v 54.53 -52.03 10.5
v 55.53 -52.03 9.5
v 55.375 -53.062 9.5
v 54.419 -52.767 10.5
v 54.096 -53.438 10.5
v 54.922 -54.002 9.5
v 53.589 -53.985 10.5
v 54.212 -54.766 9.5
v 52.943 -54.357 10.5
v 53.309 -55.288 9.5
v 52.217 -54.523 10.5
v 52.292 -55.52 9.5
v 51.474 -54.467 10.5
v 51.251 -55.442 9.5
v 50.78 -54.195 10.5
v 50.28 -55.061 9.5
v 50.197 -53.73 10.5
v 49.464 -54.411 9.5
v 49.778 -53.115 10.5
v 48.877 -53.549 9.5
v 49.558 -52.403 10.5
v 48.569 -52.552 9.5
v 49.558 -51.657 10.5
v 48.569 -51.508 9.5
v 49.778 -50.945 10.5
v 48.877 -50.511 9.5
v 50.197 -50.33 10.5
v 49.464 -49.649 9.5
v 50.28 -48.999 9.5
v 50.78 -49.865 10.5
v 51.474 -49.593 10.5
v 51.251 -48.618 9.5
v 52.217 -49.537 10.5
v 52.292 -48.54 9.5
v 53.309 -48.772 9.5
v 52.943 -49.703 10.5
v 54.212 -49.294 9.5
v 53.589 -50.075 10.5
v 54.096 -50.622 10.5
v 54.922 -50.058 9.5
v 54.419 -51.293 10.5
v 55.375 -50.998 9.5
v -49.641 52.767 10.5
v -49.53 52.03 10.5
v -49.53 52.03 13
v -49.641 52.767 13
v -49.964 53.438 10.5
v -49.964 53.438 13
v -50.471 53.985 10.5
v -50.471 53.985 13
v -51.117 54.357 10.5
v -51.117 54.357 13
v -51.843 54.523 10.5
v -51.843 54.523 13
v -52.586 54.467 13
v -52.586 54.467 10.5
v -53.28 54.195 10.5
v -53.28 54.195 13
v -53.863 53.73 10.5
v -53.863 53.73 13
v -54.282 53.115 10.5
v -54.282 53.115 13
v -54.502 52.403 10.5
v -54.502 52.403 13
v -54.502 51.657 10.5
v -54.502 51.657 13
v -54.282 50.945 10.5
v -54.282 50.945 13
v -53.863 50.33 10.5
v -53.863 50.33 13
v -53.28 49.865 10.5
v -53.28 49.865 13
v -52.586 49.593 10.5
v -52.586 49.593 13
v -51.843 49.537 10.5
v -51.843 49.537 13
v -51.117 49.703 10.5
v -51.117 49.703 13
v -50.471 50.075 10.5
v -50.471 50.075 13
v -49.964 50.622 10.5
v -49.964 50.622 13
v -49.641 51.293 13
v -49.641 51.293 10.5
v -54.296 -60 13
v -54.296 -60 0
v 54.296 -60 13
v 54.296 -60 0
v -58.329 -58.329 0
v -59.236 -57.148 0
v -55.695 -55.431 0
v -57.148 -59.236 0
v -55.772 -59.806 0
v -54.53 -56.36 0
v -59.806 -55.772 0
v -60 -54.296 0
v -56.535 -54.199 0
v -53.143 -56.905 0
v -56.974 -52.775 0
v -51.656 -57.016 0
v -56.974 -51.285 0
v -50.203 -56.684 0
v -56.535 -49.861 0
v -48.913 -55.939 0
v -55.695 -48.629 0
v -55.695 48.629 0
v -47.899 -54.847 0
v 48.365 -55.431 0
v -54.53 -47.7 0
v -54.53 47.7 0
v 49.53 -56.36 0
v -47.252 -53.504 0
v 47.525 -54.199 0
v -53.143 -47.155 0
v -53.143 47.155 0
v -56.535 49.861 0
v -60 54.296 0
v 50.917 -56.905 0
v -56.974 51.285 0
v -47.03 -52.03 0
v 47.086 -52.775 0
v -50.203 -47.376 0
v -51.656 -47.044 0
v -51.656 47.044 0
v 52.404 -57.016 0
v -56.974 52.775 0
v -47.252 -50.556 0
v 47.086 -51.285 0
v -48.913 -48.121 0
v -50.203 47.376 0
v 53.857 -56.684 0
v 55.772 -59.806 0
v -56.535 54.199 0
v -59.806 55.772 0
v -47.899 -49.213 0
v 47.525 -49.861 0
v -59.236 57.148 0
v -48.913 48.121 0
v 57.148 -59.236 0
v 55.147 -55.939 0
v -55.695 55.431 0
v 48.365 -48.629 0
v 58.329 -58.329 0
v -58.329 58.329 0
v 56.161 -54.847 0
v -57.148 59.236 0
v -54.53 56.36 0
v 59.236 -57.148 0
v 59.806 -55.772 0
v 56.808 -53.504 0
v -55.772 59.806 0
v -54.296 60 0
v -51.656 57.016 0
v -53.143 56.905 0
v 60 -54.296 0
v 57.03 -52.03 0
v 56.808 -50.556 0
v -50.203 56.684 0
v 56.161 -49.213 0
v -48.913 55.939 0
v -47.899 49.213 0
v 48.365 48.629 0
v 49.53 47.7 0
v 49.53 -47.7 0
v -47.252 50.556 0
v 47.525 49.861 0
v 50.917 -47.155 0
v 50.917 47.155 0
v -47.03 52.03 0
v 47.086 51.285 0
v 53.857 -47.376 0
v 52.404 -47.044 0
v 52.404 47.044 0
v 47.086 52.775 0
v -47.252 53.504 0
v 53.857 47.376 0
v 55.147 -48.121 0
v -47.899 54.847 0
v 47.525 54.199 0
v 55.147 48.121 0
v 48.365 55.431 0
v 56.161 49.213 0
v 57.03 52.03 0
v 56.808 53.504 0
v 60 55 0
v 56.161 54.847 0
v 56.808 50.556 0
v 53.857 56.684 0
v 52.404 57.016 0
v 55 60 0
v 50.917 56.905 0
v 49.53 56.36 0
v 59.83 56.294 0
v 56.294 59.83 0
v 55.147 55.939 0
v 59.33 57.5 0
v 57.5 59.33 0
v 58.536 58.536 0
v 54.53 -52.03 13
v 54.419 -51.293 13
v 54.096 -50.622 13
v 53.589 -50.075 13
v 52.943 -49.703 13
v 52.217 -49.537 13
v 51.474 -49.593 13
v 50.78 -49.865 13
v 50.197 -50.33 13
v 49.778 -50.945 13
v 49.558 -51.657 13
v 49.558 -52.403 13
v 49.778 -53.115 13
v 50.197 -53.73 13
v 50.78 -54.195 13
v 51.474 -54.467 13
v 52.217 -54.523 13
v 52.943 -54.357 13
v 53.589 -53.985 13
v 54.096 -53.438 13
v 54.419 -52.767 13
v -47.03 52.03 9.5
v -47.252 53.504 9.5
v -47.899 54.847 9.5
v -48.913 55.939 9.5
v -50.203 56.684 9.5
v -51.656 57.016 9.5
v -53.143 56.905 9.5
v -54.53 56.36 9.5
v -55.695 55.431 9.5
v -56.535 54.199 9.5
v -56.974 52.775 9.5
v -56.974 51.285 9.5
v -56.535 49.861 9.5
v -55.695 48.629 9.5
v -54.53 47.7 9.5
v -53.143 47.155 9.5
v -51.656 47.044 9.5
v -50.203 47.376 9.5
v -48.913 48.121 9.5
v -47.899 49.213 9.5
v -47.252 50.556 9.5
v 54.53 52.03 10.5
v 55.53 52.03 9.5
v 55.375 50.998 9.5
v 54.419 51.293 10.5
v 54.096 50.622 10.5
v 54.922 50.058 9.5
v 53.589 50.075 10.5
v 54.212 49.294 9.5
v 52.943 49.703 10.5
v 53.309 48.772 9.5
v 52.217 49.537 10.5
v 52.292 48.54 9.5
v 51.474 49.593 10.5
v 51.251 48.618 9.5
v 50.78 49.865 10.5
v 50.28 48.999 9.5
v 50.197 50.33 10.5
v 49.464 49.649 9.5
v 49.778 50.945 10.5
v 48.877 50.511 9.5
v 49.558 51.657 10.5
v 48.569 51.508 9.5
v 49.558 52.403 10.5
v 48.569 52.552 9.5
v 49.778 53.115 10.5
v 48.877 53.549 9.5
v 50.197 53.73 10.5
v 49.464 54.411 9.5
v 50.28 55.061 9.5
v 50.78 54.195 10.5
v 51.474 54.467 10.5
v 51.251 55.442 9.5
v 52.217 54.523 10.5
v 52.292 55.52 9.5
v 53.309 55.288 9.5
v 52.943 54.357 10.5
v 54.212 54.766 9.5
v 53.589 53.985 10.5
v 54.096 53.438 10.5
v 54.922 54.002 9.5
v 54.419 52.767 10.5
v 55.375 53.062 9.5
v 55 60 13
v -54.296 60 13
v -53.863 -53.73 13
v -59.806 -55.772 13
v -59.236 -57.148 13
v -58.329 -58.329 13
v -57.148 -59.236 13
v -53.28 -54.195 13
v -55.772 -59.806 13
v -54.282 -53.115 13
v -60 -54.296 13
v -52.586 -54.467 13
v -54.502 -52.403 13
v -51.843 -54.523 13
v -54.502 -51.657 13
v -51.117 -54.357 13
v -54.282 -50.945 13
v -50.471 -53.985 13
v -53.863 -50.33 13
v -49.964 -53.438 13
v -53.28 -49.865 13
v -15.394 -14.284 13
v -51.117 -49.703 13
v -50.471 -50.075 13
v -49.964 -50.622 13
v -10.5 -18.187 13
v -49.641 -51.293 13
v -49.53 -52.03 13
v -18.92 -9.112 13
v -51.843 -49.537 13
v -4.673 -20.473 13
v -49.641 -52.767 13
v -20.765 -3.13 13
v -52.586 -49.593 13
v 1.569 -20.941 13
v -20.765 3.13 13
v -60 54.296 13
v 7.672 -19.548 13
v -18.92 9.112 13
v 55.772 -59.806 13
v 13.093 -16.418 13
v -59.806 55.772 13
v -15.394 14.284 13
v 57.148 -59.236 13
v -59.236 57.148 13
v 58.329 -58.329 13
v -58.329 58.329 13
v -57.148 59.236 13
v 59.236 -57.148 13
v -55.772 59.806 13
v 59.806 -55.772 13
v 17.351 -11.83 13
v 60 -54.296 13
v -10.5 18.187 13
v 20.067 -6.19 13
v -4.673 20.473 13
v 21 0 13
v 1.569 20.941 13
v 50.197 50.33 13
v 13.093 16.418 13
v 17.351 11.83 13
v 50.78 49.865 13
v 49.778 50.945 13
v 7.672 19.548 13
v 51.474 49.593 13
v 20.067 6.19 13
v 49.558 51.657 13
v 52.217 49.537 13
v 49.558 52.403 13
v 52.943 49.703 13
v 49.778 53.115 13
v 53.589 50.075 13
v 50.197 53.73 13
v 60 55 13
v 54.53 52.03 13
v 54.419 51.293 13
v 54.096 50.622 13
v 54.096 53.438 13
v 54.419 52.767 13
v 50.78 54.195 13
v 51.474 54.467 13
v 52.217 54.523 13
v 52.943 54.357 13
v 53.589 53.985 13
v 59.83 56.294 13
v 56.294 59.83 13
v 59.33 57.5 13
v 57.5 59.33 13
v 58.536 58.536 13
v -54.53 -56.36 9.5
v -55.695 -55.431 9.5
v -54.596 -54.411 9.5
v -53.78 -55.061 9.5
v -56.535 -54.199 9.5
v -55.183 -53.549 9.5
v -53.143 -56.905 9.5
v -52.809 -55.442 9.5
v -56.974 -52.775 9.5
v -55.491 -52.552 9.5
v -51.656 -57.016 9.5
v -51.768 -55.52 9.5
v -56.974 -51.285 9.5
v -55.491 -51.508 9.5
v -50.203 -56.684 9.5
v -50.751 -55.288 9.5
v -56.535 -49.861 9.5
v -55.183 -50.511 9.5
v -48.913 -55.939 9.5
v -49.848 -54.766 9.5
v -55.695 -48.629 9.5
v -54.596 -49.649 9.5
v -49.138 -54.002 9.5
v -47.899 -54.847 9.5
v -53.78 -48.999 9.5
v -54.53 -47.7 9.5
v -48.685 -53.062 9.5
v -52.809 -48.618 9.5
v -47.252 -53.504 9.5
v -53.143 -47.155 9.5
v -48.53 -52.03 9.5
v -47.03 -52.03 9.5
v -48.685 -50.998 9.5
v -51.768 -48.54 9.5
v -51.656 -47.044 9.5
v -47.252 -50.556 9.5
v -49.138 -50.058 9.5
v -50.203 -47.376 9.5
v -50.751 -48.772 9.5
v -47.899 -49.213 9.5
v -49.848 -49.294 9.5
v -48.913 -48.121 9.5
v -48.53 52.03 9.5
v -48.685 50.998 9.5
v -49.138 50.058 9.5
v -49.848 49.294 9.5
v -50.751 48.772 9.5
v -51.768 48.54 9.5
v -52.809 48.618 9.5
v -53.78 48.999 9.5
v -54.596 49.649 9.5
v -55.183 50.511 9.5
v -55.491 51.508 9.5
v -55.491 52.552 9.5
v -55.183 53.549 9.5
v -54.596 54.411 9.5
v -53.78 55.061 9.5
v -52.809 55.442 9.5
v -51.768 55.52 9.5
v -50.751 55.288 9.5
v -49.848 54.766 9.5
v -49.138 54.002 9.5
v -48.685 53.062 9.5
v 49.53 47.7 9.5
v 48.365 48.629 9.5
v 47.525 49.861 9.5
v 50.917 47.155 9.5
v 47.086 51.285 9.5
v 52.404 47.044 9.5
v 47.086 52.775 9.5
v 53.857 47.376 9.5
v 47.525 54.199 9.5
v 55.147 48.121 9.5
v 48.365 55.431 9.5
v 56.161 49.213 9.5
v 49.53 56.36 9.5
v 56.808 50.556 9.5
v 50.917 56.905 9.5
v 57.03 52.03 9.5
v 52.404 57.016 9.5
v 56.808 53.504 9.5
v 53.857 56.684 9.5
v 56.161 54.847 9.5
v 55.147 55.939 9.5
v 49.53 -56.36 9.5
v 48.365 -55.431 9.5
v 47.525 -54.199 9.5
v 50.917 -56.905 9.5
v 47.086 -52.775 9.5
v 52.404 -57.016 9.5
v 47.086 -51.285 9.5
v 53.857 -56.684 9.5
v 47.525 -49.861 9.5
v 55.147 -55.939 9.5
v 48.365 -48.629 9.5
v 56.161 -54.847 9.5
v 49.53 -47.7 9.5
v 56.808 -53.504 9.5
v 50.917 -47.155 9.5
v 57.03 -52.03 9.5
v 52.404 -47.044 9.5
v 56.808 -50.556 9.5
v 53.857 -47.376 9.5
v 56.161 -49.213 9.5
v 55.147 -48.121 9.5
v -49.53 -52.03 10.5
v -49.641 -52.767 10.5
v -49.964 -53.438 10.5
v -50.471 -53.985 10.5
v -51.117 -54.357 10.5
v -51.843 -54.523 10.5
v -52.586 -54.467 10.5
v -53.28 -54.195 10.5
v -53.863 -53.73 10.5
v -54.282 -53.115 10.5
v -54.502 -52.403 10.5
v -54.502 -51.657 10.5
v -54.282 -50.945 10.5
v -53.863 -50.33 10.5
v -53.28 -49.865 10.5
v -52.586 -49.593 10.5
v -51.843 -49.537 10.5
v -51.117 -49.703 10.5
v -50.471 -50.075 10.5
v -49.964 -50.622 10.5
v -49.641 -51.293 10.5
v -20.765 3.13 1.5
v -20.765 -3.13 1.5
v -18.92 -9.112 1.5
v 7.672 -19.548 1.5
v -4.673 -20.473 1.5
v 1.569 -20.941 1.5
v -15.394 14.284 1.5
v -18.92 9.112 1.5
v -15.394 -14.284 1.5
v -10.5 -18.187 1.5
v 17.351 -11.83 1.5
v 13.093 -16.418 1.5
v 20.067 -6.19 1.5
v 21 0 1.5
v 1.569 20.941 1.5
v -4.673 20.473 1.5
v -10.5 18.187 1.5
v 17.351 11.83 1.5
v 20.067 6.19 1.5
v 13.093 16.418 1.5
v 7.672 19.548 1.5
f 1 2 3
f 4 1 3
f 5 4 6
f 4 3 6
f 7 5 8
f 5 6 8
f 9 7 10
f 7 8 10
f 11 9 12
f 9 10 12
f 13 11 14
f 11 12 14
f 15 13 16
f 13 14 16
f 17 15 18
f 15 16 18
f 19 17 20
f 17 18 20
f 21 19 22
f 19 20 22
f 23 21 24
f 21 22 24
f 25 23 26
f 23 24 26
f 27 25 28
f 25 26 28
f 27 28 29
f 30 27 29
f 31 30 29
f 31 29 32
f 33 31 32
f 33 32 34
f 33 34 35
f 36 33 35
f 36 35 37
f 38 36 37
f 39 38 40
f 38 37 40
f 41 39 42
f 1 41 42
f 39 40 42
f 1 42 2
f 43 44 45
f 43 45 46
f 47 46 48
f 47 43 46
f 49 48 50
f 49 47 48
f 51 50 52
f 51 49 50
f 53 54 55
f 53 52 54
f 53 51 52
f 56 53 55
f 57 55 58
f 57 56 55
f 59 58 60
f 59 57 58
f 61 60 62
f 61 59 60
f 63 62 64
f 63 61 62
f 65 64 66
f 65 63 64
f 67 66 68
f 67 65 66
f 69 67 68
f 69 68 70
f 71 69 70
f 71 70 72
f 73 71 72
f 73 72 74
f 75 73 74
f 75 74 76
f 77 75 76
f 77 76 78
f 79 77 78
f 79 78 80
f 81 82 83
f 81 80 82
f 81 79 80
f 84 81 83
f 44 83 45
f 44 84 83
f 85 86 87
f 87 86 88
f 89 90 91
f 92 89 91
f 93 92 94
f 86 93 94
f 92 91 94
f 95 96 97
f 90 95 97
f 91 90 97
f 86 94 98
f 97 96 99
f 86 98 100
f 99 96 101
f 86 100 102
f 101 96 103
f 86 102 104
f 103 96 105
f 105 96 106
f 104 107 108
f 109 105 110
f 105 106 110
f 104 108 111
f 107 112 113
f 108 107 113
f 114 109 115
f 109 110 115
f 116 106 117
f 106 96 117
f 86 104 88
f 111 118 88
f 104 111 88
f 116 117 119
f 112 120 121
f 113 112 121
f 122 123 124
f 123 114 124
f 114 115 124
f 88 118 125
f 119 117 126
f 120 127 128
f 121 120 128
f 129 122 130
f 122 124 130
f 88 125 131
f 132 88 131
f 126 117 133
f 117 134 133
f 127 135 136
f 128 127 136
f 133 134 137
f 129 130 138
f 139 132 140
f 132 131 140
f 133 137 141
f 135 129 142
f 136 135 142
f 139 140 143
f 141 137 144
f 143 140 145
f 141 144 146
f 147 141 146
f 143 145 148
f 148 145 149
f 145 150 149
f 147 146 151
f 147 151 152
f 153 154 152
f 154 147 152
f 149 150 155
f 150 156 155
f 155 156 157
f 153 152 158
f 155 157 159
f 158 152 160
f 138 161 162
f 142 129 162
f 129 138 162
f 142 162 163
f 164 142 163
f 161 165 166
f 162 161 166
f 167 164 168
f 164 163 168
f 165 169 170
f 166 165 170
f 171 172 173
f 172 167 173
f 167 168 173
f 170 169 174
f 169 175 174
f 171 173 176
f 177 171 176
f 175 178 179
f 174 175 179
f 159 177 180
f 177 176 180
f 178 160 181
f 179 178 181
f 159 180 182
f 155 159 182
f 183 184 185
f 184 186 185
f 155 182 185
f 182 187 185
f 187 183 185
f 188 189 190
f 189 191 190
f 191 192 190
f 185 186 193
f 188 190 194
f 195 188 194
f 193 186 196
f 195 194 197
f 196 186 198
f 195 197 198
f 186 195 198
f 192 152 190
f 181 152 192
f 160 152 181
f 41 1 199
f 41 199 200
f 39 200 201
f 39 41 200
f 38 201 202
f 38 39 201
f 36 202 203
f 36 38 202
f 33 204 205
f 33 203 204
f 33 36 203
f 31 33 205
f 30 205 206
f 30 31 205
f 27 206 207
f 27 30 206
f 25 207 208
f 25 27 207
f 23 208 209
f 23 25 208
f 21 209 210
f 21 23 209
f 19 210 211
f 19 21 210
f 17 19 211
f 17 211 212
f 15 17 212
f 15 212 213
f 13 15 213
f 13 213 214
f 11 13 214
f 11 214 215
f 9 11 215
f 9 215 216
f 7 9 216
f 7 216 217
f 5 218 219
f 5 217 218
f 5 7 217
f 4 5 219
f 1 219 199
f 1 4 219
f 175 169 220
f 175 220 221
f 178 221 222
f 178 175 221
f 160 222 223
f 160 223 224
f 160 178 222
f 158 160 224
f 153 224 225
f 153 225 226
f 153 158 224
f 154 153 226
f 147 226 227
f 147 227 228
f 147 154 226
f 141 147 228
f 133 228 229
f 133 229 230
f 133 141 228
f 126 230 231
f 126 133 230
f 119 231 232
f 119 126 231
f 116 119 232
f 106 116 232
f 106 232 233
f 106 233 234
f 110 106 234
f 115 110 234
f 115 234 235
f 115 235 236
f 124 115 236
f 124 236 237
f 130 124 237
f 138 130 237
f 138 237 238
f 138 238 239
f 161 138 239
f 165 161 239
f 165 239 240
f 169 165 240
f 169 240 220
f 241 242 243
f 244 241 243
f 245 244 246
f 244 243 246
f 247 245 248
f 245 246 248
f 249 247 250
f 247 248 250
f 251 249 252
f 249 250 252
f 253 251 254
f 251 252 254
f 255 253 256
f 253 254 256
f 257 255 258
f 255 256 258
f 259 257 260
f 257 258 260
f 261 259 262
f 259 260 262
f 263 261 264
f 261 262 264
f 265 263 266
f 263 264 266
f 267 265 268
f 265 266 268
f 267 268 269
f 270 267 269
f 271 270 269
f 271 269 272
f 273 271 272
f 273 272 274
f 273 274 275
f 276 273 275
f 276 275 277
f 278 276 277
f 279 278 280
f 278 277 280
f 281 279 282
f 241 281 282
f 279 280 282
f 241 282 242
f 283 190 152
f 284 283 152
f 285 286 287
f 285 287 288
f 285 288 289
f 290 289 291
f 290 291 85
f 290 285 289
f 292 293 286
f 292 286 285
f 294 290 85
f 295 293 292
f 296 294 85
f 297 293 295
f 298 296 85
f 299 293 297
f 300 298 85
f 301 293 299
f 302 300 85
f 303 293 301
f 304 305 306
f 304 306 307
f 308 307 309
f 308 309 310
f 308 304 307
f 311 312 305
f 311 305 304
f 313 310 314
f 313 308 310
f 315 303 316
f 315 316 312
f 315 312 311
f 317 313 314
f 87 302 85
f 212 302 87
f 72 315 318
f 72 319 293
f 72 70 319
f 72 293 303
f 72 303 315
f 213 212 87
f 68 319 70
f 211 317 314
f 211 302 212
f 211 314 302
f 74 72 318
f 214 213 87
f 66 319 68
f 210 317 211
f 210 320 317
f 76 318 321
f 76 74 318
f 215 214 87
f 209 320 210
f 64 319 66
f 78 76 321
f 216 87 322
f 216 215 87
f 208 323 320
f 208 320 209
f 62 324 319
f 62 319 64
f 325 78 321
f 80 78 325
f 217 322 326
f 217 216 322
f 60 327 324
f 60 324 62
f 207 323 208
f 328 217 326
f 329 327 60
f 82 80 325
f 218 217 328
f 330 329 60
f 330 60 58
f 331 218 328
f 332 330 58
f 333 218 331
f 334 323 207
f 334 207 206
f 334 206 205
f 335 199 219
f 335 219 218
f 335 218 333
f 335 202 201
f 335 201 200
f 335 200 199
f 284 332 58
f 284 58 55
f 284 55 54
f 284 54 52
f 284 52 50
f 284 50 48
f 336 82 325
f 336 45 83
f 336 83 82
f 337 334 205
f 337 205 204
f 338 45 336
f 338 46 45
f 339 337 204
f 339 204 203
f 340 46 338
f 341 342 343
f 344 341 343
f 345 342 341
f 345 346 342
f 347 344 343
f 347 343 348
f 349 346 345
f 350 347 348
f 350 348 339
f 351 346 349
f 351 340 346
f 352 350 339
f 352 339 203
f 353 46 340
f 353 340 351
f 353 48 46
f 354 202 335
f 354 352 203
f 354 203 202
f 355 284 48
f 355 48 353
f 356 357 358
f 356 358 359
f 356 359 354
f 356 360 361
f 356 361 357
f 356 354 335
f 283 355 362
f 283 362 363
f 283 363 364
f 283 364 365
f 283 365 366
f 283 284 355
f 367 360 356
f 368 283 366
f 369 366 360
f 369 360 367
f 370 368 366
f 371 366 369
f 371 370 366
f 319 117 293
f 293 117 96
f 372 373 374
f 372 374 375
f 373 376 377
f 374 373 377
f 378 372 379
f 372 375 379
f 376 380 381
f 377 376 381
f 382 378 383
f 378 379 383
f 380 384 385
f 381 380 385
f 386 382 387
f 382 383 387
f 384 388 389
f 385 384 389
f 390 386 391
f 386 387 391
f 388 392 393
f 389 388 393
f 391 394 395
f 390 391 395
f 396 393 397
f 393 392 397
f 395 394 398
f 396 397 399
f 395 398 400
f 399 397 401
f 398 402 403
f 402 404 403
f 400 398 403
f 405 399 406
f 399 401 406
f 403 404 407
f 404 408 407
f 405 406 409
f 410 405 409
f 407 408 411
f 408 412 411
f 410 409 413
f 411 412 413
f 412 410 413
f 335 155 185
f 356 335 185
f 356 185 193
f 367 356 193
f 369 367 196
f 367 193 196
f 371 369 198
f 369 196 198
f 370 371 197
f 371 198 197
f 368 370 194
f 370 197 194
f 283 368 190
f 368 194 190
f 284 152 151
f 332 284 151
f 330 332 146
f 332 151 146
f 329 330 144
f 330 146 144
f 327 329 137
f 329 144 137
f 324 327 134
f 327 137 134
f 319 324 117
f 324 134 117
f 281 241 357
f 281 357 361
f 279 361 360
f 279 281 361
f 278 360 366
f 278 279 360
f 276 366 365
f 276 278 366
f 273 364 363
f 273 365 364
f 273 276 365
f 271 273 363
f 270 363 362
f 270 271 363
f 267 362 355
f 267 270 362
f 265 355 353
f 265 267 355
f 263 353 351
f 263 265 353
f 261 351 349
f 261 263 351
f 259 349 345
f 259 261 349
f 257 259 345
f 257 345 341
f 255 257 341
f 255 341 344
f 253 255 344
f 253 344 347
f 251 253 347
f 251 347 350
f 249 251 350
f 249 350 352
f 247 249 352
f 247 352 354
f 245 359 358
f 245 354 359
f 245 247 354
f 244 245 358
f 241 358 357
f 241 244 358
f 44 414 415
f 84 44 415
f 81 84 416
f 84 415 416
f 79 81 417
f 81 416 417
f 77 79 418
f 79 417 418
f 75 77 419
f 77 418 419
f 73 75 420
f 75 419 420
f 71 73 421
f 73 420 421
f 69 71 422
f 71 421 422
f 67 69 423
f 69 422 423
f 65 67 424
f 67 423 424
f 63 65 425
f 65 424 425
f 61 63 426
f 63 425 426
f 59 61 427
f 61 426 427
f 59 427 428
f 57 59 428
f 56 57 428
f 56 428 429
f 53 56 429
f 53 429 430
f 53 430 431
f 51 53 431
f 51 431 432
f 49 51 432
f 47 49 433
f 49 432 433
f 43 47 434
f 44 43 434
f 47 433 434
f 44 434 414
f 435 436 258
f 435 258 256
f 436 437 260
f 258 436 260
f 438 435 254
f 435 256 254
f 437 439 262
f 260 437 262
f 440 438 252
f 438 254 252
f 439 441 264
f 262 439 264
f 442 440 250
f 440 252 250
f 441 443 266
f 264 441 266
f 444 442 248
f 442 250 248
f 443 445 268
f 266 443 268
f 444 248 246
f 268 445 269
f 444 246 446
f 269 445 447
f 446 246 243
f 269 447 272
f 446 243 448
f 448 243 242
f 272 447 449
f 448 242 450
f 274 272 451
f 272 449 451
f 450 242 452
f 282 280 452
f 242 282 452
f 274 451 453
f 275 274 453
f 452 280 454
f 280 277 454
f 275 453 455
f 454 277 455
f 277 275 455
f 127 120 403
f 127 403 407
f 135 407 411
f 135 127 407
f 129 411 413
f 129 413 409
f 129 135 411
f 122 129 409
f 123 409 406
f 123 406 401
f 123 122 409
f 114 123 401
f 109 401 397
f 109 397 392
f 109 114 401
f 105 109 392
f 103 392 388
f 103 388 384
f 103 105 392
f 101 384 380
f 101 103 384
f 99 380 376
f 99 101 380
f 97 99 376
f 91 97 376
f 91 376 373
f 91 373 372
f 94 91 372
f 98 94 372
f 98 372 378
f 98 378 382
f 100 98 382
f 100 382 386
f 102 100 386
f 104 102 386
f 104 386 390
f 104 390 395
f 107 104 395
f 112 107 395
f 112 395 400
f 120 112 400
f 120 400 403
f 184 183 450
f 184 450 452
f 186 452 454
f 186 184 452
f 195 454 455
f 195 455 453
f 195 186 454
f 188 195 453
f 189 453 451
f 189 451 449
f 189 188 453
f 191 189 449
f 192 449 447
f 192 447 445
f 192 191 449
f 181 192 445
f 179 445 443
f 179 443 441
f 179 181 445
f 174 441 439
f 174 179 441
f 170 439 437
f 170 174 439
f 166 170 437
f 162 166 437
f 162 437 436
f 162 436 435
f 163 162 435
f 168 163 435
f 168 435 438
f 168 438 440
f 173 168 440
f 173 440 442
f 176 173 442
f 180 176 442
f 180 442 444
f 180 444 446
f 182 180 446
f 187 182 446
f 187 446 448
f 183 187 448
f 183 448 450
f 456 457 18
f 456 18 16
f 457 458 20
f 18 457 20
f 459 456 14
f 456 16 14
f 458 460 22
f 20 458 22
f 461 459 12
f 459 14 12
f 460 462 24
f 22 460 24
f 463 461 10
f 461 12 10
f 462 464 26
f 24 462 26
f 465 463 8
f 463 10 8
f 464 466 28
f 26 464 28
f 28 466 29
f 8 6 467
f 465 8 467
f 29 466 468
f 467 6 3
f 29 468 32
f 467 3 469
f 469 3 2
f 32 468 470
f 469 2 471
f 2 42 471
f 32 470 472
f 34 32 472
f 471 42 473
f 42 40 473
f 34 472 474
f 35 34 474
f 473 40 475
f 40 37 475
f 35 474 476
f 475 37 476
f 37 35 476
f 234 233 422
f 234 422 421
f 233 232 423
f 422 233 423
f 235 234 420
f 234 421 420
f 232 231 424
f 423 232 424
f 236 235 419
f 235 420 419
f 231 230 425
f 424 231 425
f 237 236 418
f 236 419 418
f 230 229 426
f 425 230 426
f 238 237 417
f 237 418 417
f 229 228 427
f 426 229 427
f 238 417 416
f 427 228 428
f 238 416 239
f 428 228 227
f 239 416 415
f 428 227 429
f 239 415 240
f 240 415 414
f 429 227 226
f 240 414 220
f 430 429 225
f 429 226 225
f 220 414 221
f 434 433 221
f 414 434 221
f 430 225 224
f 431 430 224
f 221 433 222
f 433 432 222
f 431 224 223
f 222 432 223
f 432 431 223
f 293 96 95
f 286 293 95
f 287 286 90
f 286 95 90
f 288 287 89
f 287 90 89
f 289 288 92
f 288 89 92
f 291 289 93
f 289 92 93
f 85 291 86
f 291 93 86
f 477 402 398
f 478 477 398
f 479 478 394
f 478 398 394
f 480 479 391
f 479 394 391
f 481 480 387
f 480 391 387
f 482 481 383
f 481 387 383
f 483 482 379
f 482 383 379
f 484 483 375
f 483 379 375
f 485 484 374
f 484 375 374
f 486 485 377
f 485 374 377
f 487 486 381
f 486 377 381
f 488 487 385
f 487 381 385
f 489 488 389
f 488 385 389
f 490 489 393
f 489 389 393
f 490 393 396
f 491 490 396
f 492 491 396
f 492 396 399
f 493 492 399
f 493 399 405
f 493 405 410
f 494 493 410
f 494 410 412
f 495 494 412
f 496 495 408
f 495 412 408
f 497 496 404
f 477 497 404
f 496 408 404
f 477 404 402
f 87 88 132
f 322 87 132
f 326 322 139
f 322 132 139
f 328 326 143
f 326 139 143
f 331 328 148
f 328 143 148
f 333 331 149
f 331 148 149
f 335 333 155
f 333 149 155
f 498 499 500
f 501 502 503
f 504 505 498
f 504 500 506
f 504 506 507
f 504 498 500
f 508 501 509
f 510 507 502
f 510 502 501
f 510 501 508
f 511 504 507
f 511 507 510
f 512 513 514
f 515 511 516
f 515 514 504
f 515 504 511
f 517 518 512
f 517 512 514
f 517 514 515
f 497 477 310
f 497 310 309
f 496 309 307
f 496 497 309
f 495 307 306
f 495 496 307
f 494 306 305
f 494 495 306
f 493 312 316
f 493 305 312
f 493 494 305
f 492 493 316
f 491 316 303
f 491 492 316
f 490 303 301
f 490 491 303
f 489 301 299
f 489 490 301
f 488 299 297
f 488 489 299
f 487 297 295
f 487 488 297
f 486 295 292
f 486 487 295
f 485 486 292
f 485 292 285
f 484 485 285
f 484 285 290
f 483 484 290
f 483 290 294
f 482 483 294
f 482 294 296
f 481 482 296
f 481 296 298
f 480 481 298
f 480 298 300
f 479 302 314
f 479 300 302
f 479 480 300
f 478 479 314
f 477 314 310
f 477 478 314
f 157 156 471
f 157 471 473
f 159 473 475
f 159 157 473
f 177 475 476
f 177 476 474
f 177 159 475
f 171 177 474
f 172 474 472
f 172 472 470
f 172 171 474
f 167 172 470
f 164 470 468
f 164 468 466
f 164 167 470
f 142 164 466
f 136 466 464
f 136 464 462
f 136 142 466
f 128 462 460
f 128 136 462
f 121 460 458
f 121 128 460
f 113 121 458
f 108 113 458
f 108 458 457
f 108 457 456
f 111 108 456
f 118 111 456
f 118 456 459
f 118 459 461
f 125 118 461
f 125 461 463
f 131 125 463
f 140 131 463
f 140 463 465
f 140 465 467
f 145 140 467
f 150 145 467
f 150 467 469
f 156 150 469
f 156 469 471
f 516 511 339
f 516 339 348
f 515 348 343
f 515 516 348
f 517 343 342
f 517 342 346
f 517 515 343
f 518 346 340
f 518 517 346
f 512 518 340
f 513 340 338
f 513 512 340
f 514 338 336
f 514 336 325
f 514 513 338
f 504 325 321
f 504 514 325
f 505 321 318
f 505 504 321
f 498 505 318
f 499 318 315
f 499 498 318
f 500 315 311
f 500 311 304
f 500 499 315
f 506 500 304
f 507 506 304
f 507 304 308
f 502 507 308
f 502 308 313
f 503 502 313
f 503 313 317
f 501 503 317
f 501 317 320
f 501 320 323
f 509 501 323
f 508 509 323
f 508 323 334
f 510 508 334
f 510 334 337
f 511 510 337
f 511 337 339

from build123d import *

# Parameters (mm, degrees)
F0_R     = 4.9999993943
F0_R_2   = 4.9999985195
F0_R_3   = 5
F0_R_4   = 21
F1_DEPTH = 13
F2_DEPTH = 1.5
F3_R     = 4.9999985195
F3_R_2   = 4.9999993943
F3_R_3   = 5
F4_DEPTH = 3.5
F0_R_5   = 2.5
F5_DEPTH = 27.6
F6_SIZE  = 1


with BuildPart() as f1:
    # F0 (on Top) → F1 (new body)
    with BuildSketch(Plane.XY):
        with BuildLine():
            Line((55, 60), (-54.2957481862, 60))
            ThreePointArc((-54.2957481862, 60), (-58.3292633253, 58.3292633253), (-60, 54.2957481862))
            Line((-60, 54.2957481862), (-60, -54.2957481862))
            ThreePointArc((-60, -54.2957481862), (-58.3292633253, -58.3292633253), (-54.2957481862, -60))
            Line((-54.2957481862, -60), (54.2957481862, -60))
            ThreePointArc((54.2957481862, -60), (58.3292633253, -58.3292633253), (60, -54.2957481862))
            Line((60, -54.2957481862), (60, 55))
            ThreePointArc((60, 55), (58.5355339059, 58.5355339059), (55, 60))
        make_face()
        with Locations((-52.03, -52.03)):
            Circle(F0_R, mode=Mode.SUBTRACT)
        with Locations((52.03, -52.03)):
            Circle(F0_R_2, mode=Mode.SUBTRACT)
        with Locations((-52.03, 52.03)):
            Circle(F0_R_3, mode=Mode.SUBTRACT)
        Circle(F0_R_4, mode=Mode.SUBTRACT)
        with Locations((52.03, 52.03)):
            Circle(F0_R_3, mode=Mode.SUBTRACT)
    extrude(amount=F1_DEPTH)

    # F0 (on Top) → F2 (join)
    with BuildSketch(Plane.XY):
        Circle(F0_R_4)
    extrude(amount=F2_DEPTH)

    # F3 (on face) → F4 (join)
    with BuildSketch(Plane.XY.offset(13)):
        with Locations((52.03, -52.03)):
            Circle(F3_R)
        with Locations((-52.03, -52.03)):
            Circle(F3_R_2)
        with Locations((-52.03, 52.03)):
            Circle(F3_R_3)
        with Locations((52.03, 52.03)):
            Circle(F3_R_3)
    extrude(amount=-F4_DEPTH)

    # F0 (on Top) → F5 (cut)
    with BuildSketch(Plane.XY):
        with Locations((-52.03, -52.03)):
            Circle(F0_R_5)
        with Locations((52.03, -52.03)):
            Circle(F0_R_5)
        with Locations((52.03, 52.03)):
            Circle(F0_R_5)
        with Locations((-52.03, 52.03)):
            Circle(F0_R_5)
    extrude(amount=F5_DEPTH, mode=Mode.SUBTRACT)

    # F6
    f6_edges = [f1.edges().sort_by_distance(p)[0] for p in [
        (49.53, 52.03, 9.5),
        (-54.53, 52.03, 9.5),
        (49.53, -52.03, 9.5),
        (-54.53, -52.03, 9.5),
    ]]
    chamfer(f6_edges, length=F6_SIZE)


solid = f1.part
